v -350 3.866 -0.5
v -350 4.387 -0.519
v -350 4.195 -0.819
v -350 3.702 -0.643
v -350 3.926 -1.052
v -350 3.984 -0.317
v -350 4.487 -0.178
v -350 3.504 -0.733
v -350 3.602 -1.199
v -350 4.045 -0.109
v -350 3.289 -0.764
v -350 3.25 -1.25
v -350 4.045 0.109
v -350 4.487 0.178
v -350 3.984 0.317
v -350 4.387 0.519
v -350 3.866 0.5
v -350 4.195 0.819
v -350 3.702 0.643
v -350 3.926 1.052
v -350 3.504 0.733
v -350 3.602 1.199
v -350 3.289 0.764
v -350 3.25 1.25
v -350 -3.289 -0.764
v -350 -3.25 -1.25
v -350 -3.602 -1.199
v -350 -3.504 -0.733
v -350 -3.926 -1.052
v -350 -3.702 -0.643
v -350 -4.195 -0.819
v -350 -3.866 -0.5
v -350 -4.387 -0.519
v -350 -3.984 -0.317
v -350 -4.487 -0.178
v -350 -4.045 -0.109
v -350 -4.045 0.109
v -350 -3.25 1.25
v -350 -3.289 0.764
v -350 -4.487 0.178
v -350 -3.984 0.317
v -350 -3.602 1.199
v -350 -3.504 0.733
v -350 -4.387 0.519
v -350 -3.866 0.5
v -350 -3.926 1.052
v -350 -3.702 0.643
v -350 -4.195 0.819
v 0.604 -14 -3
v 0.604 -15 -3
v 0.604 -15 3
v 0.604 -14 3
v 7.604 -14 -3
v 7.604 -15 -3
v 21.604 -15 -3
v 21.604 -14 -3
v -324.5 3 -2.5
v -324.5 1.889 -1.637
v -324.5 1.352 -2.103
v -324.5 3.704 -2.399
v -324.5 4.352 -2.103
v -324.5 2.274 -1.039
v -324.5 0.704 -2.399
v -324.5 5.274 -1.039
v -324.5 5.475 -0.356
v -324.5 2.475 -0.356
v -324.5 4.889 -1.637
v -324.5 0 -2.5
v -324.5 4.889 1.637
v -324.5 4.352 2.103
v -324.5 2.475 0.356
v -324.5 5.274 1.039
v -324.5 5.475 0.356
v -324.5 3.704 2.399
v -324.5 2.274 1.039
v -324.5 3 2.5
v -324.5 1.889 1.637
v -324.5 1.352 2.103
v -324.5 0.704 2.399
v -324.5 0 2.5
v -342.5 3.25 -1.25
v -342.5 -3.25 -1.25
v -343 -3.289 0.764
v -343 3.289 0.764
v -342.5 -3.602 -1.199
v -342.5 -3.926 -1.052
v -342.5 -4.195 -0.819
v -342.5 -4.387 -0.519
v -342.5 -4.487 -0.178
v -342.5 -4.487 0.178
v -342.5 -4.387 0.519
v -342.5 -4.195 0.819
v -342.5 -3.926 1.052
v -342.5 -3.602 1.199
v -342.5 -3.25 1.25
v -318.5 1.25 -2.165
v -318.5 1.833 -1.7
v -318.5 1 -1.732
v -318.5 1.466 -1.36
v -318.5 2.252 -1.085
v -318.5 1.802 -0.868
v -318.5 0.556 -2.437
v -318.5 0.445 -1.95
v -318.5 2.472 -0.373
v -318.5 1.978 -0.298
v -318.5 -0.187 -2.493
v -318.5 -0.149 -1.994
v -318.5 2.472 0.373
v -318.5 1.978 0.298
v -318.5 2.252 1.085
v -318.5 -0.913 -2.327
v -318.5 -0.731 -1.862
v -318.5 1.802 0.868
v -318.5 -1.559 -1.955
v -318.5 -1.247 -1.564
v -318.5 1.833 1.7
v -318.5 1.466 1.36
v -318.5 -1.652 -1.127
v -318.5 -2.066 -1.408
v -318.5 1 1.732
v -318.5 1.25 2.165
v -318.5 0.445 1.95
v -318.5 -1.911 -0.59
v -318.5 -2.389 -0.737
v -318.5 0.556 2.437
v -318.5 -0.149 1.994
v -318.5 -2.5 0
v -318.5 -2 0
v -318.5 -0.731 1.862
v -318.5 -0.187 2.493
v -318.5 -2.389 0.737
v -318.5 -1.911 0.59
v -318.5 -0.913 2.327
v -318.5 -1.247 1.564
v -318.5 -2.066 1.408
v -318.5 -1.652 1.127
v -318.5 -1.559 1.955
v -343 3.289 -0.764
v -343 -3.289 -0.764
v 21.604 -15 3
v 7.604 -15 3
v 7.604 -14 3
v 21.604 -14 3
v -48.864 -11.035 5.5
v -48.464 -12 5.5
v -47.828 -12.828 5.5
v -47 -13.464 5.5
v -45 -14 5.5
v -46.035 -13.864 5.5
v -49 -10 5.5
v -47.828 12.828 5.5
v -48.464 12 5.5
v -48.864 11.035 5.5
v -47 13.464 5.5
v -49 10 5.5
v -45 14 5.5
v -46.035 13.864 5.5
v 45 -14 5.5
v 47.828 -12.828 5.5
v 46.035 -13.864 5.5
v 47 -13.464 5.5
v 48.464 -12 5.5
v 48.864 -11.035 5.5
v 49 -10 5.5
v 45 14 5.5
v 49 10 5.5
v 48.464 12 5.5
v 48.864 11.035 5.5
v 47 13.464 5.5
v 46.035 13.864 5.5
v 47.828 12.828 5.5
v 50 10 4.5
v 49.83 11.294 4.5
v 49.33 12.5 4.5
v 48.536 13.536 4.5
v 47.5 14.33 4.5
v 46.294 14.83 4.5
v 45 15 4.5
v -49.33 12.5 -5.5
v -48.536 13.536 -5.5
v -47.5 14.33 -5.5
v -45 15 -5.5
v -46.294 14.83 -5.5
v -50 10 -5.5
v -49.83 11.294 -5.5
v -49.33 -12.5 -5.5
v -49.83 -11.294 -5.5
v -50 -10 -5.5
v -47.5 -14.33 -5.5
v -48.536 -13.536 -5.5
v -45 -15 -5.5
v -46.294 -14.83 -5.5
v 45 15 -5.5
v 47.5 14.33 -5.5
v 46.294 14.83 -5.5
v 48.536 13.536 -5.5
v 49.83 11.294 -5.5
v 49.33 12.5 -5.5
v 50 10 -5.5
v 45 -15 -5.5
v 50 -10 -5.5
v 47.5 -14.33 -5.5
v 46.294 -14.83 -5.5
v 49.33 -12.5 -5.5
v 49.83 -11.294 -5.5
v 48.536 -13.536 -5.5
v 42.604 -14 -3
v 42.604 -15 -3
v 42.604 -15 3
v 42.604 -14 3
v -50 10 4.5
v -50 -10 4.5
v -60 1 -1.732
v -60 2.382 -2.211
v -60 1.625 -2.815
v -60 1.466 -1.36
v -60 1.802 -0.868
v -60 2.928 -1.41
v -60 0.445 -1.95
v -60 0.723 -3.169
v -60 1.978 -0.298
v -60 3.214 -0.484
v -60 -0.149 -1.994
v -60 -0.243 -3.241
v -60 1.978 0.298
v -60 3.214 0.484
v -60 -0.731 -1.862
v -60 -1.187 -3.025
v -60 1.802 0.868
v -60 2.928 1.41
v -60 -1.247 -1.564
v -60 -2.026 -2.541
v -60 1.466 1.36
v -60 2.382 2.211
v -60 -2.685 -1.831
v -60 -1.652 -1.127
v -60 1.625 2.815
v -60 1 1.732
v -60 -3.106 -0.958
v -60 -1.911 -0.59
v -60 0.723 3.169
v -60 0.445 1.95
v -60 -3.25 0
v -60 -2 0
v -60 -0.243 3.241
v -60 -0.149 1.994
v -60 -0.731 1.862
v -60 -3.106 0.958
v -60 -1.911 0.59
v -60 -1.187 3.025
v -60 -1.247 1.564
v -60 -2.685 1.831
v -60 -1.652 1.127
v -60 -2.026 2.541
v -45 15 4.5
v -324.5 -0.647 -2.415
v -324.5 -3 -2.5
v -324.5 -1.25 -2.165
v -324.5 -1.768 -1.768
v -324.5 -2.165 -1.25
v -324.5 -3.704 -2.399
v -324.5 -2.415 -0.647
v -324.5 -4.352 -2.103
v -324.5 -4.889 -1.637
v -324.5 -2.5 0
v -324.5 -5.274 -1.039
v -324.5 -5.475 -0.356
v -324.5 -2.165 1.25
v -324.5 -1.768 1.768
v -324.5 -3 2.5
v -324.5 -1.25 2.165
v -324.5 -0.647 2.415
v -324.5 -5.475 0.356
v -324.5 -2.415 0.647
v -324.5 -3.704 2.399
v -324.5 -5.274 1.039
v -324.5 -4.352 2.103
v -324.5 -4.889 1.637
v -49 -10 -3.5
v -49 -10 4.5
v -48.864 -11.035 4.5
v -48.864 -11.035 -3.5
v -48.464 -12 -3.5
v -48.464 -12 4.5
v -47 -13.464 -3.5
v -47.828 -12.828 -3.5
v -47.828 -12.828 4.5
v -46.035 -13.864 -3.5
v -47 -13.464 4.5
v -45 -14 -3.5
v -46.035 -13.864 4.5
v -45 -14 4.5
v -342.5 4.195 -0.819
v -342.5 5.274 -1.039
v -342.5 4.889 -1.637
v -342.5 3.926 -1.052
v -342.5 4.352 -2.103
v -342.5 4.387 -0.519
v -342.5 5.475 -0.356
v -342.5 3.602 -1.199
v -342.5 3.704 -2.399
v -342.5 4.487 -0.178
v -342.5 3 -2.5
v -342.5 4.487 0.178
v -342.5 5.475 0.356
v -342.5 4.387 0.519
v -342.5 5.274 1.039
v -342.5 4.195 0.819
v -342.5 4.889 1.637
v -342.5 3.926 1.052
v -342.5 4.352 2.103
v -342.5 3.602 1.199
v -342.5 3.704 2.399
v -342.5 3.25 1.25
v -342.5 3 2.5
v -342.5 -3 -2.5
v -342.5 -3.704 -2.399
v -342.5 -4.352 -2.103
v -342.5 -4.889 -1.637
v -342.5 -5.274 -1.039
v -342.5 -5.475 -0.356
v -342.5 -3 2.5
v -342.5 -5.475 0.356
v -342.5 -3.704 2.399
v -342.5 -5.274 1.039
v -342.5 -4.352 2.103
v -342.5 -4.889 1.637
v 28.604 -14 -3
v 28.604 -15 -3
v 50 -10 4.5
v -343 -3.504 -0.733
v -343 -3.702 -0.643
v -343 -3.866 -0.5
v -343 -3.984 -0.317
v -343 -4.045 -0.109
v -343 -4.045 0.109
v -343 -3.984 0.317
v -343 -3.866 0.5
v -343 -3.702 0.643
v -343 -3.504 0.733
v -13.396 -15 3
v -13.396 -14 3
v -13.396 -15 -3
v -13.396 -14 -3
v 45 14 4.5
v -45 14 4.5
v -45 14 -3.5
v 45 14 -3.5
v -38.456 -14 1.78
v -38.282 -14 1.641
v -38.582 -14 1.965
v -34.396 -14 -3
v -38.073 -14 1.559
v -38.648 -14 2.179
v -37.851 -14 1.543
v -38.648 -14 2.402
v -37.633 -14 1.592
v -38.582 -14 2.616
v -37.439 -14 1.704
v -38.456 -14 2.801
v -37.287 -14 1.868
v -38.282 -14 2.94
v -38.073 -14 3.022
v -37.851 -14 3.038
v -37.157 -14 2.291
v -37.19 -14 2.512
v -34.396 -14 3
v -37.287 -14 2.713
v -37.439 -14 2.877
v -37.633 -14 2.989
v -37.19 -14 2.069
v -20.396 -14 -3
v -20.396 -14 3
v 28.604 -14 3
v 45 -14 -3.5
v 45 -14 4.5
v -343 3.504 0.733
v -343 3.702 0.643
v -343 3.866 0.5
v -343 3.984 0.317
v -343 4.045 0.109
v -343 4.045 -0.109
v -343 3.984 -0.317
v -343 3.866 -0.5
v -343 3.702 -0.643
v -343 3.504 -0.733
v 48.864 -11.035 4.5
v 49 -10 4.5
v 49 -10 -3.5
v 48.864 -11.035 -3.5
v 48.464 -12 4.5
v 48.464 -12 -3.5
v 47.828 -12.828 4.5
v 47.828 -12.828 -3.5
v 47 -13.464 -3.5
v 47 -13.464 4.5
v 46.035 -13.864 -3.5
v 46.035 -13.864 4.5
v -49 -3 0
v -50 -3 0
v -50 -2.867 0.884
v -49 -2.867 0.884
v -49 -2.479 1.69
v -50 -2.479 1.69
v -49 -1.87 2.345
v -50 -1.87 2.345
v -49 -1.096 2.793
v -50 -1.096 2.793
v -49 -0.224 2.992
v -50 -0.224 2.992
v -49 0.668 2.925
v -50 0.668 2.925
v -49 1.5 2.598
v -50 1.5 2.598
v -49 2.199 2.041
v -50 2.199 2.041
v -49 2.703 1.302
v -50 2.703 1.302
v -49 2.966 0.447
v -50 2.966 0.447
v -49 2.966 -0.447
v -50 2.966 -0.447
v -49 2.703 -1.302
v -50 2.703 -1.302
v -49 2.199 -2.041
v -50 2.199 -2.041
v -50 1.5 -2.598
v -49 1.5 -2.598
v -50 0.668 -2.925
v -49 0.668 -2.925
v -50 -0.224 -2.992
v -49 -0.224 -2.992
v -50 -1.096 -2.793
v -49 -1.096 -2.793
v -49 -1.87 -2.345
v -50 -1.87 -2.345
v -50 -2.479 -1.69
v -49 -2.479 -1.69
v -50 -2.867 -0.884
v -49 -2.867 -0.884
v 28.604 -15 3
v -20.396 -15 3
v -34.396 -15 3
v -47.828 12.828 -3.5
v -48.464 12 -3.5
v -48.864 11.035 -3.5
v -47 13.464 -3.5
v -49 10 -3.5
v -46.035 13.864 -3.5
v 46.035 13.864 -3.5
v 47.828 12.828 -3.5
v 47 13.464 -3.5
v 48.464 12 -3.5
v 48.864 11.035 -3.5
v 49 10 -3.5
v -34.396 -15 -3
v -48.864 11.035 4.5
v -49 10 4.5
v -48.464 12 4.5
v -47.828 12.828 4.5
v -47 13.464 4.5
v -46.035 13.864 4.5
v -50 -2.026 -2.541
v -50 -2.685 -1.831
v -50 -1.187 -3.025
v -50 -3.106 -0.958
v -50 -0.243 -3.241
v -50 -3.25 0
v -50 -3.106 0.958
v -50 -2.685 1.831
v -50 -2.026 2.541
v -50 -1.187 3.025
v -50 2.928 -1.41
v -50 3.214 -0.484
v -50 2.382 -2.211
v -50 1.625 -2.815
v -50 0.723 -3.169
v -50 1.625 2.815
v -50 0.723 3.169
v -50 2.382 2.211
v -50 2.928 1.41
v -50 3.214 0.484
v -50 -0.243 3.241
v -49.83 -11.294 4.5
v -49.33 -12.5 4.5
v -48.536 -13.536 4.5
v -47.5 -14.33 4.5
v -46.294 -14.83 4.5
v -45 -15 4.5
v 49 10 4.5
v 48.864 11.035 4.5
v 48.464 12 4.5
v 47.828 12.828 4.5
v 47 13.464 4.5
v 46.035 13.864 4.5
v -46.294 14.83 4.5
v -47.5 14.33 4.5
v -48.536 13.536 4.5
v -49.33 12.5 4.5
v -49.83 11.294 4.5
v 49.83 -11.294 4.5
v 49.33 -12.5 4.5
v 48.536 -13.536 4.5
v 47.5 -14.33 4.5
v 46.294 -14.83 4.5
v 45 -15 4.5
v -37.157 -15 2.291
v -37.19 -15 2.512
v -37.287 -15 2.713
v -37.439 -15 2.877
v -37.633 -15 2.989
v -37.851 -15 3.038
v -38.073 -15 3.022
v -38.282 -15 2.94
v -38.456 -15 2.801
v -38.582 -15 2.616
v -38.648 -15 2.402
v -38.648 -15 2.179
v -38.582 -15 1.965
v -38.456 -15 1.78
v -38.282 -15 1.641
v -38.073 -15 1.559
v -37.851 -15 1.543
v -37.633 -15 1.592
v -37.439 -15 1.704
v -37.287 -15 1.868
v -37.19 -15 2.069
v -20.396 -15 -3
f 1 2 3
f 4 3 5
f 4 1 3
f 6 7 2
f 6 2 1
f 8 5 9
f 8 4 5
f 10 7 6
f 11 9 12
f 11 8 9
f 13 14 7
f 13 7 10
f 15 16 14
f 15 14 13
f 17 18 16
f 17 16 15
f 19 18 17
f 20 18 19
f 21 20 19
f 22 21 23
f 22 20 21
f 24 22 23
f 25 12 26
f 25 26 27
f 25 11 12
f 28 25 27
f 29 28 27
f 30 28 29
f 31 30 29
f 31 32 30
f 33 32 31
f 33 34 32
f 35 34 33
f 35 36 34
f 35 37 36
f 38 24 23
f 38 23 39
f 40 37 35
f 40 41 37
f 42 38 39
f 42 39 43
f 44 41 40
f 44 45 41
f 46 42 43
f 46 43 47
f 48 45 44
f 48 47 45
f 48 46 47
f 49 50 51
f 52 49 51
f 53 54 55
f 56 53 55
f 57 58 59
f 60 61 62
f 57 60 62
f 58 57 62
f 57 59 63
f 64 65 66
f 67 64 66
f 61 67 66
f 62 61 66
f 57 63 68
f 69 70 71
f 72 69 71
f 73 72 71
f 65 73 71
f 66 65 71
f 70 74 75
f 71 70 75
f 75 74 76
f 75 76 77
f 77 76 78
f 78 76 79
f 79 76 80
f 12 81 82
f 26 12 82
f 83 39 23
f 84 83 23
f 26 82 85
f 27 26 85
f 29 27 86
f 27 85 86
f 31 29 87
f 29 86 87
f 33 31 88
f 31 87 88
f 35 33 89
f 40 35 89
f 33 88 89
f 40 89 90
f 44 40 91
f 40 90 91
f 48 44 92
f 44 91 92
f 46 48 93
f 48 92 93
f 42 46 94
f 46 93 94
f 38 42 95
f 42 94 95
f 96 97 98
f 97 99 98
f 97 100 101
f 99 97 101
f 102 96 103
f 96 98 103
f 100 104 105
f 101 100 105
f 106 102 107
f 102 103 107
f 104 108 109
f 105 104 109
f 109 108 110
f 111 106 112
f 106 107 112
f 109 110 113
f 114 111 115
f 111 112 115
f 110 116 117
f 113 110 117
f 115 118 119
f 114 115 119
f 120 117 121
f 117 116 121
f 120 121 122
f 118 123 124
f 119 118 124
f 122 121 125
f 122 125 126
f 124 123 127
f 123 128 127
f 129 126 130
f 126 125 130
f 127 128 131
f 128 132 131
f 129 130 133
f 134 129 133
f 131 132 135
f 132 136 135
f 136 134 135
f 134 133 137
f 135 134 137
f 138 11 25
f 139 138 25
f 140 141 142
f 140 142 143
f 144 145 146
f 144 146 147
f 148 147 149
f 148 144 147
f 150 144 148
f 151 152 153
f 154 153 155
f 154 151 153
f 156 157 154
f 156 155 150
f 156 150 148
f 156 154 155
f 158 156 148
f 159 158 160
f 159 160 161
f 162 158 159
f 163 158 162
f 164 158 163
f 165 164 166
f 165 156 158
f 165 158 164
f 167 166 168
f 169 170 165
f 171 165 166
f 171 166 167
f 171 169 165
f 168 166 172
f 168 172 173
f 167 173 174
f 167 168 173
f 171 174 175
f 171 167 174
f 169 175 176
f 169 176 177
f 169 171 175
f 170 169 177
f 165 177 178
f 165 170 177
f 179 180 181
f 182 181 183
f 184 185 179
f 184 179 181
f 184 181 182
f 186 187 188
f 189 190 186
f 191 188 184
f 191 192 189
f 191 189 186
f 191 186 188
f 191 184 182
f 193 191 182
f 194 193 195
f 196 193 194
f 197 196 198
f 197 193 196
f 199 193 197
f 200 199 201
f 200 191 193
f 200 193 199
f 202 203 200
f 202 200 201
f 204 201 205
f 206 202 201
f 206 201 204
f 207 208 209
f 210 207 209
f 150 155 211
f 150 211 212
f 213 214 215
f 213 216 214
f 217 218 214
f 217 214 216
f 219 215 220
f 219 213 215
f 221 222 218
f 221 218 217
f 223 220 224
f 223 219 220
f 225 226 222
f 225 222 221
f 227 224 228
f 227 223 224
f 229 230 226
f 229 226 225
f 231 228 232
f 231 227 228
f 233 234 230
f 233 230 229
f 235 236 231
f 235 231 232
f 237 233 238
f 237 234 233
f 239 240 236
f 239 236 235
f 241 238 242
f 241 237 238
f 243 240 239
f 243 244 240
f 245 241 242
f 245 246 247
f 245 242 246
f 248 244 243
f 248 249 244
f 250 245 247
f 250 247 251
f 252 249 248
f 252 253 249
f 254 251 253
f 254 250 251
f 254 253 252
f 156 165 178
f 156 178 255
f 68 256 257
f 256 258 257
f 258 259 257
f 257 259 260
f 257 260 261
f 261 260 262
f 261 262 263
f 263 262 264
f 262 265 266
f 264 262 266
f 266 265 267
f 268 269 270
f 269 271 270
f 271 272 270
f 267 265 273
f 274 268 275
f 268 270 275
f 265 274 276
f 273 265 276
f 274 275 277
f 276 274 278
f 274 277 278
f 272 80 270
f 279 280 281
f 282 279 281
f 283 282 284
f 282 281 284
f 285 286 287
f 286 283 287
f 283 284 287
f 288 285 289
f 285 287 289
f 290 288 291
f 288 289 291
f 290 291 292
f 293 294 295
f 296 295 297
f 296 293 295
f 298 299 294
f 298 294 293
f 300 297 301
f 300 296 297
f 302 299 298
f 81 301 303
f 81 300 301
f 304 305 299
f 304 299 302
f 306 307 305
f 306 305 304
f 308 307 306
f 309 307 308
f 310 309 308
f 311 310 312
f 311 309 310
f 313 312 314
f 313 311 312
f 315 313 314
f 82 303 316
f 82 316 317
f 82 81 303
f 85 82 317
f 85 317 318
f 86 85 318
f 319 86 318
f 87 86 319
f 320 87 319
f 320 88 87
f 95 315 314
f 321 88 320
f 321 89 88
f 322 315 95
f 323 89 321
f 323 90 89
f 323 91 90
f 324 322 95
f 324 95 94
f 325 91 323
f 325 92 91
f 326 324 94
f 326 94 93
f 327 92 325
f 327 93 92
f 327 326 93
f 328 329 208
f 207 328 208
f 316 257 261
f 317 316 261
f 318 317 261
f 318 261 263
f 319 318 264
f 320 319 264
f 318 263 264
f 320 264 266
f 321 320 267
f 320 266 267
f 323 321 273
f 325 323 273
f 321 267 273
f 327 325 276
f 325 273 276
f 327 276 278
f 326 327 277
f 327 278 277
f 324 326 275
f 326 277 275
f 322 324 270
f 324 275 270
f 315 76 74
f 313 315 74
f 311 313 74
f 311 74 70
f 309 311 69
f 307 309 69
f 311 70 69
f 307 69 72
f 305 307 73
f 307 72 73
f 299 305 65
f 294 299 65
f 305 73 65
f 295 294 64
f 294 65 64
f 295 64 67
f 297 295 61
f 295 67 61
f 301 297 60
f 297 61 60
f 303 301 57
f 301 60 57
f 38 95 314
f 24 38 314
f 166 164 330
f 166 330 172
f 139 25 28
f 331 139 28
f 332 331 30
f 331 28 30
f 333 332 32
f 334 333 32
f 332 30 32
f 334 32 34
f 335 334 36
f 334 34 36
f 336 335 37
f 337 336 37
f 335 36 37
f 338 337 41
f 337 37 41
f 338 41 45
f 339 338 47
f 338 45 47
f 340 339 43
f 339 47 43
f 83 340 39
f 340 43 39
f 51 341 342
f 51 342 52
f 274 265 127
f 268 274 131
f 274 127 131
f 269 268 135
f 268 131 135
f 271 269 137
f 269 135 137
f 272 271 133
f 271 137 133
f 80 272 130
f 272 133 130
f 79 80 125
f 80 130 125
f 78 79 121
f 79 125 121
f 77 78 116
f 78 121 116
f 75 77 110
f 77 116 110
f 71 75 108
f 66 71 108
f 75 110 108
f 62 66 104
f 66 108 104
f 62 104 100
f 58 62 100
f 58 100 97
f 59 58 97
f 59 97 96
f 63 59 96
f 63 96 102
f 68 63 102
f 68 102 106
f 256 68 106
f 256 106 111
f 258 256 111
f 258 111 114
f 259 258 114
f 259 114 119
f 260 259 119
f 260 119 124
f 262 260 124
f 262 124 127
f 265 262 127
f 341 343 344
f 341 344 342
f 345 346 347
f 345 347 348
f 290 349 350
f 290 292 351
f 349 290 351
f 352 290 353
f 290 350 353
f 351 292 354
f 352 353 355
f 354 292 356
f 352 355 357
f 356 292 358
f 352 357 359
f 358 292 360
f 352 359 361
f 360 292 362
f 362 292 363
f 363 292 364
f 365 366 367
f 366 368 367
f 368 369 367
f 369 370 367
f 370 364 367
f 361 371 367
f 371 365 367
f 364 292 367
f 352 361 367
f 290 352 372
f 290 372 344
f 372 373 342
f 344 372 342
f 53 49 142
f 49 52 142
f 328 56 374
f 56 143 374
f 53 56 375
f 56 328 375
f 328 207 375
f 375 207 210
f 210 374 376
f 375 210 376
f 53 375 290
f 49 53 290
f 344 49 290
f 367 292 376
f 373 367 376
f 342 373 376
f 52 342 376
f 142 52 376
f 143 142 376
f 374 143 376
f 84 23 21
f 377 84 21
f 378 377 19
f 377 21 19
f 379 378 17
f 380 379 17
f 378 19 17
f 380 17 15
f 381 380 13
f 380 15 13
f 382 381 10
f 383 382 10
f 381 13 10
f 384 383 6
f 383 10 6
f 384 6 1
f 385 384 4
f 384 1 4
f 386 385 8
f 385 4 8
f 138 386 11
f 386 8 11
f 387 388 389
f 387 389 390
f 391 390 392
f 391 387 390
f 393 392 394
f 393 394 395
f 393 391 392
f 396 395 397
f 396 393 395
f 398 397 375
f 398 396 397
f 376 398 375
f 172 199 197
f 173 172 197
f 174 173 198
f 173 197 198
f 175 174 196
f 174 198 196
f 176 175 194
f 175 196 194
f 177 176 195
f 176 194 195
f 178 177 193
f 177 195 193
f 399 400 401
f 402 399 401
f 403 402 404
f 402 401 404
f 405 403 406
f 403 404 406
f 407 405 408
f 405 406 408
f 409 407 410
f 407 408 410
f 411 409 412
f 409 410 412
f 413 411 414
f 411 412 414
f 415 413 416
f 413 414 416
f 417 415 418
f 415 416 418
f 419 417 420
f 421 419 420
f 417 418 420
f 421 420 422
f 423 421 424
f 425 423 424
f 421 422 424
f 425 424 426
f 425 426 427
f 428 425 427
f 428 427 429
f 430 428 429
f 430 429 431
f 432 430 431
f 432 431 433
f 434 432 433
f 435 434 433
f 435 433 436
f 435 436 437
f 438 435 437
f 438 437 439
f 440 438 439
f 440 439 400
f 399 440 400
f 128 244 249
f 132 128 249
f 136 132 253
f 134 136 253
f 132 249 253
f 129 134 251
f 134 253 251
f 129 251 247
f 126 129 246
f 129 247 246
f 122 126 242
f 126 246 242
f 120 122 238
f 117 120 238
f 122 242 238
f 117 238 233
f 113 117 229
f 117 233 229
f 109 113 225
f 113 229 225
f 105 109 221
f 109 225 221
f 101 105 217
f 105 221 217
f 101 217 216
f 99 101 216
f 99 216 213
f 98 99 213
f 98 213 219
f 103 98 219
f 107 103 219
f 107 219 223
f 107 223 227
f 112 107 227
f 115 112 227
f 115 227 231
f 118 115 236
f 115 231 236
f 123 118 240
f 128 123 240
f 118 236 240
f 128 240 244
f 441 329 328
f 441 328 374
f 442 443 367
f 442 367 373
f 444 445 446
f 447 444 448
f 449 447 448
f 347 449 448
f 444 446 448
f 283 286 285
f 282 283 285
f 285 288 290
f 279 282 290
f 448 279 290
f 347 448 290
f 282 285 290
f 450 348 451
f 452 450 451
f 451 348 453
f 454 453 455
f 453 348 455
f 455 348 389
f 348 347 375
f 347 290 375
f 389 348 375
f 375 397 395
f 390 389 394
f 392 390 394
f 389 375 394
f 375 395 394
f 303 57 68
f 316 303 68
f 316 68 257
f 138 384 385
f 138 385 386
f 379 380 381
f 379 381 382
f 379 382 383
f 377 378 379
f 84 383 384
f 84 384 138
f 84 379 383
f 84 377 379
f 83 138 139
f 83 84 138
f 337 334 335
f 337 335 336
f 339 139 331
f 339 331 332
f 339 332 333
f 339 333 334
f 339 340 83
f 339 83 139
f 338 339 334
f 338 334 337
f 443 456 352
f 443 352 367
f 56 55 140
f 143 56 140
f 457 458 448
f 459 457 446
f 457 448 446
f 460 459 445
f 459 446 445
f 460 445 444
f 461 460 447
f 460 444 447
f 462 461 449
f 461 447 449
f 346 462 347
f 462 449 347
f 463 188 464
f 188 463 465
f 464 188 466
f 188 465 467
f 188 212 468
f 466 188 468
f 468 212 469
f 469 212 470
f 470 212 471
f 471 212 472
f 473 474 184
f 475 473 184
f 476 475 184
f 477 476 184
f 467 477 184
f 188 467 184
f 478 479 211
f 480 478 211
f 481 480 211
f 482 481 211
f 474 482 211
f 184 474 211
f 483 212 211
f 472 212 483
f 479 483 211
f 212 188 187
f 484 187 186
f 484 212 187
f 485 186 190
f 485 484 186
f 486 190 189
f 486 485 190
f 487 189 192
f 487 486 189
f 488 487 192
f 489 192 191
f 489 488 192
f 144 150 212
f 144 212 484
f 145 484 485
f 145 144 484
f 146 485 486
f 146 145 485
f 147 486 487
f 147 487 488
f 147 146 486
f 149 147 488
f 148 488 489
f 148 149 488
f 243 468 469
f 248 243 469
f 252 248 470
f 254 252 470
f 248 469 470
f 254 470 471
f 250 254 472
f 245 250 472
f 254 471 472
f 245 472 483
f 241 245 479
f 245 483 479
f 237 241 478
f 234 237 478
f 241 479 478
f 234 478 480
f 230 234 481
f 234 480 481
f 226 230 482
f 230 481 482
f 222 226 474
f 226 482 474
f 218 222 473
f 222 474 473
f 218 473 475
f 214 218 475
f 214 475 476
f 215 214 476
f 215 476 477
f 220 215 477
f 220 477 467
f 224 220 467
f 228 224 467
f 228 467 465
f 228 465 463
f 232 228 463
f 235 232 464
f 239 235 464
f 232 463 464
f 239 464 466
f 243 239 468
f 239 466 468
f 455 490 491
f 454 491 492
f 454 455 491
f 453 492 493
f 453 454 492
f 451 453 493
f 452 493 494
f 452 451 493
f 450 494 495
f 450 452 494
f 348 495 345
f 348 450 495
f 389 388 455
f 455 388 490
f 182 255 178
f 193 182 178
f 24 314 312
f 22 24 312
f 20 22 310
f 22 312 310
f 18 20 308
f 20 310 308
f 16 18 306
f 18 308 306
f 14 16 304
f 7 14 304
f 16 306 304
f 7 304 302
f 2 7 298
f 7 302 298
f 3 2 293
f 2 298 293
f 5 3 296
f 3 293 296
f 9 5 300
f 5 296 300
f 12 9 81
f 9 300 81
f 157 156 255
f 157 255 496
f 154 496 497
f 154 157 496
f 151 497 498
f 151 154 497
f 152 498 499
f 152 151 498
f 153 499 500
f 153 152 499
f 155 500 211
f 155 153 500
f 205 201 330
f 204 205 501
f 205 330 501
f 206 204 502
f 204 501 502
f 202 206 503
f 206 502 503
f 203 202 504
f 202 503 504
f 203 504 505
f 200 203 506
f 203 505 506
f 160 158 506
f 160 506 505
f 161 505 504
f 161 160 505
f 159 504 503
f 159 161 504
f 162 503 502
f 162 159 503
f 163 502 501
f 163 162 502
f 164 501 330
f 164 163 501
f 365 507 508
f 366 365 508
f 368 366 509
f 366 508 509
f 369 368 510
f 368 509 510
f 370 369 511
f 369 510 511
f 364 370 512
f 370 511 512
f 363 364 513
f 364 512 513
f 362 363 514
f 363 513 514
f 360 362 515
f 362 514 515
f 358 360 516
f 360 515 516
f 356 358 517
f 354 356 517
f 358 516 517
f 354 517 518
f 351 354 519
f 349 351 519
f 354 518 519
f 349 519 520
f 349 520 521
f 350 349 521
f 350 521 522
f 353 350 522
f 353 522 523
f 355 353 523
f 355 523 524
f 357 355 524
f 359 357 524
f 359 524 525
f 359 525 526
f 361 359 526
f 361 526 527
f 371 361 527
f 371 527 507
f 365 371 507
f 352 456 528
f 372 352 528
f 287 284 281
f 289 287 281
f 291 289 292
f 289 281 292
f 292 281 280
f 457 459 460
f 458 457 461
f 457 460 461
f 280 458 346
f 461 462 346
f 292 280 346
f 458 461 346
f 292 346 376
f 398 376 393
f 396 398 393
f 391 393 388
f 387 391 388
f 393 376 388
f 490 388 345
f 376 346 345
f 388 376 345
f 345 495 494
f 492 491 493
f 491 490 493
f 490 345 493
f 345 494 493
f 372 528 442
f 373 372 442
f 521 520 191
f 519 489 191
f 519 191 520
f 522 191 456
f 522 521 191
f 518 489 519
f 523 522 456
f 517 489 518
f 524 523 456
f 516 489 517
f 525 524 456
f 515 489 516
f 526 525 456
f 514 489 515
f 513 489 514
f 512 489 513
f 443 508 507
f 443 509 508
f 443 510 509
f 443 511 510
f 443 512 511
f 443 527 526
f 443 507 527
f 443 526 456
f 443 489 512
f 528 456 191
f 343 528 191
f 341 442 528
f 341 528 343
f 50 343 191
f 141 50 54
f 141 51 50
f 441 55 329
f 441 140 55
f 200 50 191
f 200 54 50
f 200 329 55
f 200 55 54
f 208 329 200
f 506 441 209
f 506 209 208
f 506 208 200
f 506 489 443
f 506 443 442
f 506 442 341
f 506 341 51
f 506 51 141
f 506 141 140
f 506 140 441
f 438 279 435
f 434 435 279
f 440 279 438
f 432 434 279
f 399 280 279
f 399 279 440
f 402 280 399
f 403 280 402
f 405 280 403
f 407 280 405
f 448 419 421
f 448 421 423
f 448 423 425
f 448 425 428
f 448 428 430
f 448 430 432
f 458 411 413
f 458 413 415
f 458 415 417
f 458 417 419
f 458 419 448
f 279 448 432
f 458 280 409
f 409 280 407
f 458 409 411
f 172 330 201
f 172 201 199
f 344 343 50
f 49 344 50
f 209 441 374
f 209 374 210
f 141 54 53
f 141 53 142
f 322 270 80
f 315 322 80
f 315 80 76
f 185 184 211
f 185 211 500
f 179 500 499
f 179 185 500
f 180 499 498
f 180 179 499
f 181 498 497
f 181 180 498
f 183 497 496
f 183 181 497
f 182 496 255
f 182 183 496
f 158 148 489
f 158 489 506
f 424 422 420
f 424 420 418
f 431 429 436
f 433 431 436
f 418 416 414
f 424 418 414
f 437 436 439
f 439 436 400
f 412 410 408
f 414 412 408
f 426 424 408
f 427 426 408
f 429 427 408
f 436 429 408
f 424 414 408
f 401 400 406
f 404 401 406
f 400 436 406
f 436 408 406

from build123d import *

# Parameters (mm, degrees)
SKETCH_W        = 100
SKETCH_H        = 30
PAD_DEPTH       = 5.5
FILLET_R        = 5
THICKNESS_T     = -1
PAD001_DEPTH    = 2
CHAMFER_SIZE    = 1
SKETCH002_R     = 3
HOLE_DEPTH      = 25
HOLE_TIPS_R     = 3
SKETCH003_R     = 0.75
SKETCH003_W     = 14
SKETCH003_H     = 6
POCKET_DEPTH    = 5
SKETCH004_R     = 3.25
PAD002_DEPTH    = 10
SKETCH005_R     = 2
PAD003_DEPTH    = 258.5
SKETCH006_R     = 2.5
PAD004_DEPTH    = 6
PAD005_DEPTH    = 18
PAD006_DEPTH    = 7.5
POCKET001_DEPTH = 7


with BuildPart() as part:
    # Sketch → Pad (new body, symmetric)
    with BuildSketch(Plane.XY):
        Rectangle(SKETCH_W, SKETCH_H)
    extrude(amount=PAD_DEPTH, both=True)

    # Fillet
    fillet_edges = [part.edges().sort_by_distance(p)[0] for p in [
        (-50, -15, 0),
        (-50, 15, 0),
        (50, 15, 0),
        (50, -15, 0),
    ]]
    fillet(fillet_edges, radius=FILLET_R)

    # Thickness
    thickness_openings = [part.faces().sort_by_distance(p)[0] for p in [
        (0, 0, -5.5),
    ]]
    offset(amount=THICKNESS_T, openings=thickness_openings)

    # Sketch001 (on Face10 of Thickness) → Pad001 (join)
    with BuildSketch(Plane(origin=(0, 0, -5.5), x_dir=(1, 0, 0), z_dir=(0, 0, -1))):
        with BuildLine():
            ThreePointArc((-45, 14), (-47.828427, 12.828427), (-49, 10))
            Line((-49, -10), (-49, 10))
            ThreePointArc((-49, -10), (-47.828427, -12.828427), (-45, -14))
            Line((45, -14), (-45, -14))
            ThreePointArc((45, -14), (47.828427, -12.828427), (49, -10))
            Line((49, 10), (49, -10))
            ThreePointArc((49, 10), (47.828427, 12.828427), (45, 14))
            Line((-45, 14), (45, 14))
        make_face()
    extrude(amount=-PAD001_DEPTH)

    # Chamfer
    chamfer_edges = [part.edges().sort_by_distance(p)[0] for p in [
        (0, -15, 5.5),
        (48.535534, -13.535534, 5.5),
        (50, 0, 5.5),
        (48.535534, 13.535534, 5.5),
        (0, 15, 5.5),
        (-48.535534, 13.535534, 5.5),
        (-50, 0, 5.5),
        (-48.535534, -13.535534, 5.5),
    ]]
    chamfer(chamfer_edges, length=CHAMFER_SIZE)

    # Sketch002 (on Face7 of Chamfer) → Hole (cut)
    with BuildSketch(Plane(origin=(-50, 0, 0), x_dir=(0, -1, 0), z_dir=(-1, 0, 0))):
        Circle(SKETCH002_R)
    extrude(amount=-HOLE_DEPTH, mode=Mode.SUBTRACT)

    # Hole tips → Hole tip 1 section 0
    with BuildSketch(Plane(origin=(-25, 0, 0), x_dir=(0, -1, 0), z_dir=(-1, 0, 0)), mode=Mode.PRIVATE) as hole_tip_1_s0:
        Circle(HOLE_TIPS_R)
    loft([hole_tip_1_s0.sketch, Vertex(-23.197418, 0, 0)], mode=Mode.SUBTRACT)

    # Sketch003 (on Face11 of Hole) → Pocket (cut)
    with BuildSketch(Plane.XZ.offset(15)):
        with Locations((-37.906574, 2.290524)):
            Circle(SKETCH003_R)
        with Locations((35.604452, 0)):
            Rectangle(SKETCH003_W, SKETCH003_H)
        with Locations((14.604452, 0)):
            Rectangle(SKETCH003_W, SKETCH003_H)
        with Locations((-6.395548, 0)):
            Rectangle(SKETCH003_W, SKETCH003_H)
        with Locations((-27.395548, 0)):
            Rectangle(SKETCH003_W, SKETCH003_H)
    extrude(amount=-POCKET_DEPTH, mode=Mode.SUBTRACT)

    # Sketch004 (on Face7 of Pocket) → Pad002 (join)
    with BuildSketch(Plane(origin=(-50, 0, 0), x_dir=(0, -1, 0), z_dir=(-1, 0, 0))):
        Circle(SKETCH004_R)
    extrude(amount=PAD002_DEPTH)

    # Sketch005 (on Face38 of Pad002) → Pad003 (join)
    with BuildSketch(Plane(origin=(-60, 0, 0), x_dir=(0, -1, 0), z_dir=(-1, 0, 0))):
        Circle(SKETCH005_R)
    extrude(amount=PAD003_DEPTH)

    # Sketch006 (on Face45 of Pad003) → Pad004 (join)
    with BuildSketch(Plane(origin=(-318.5, 0, 0), x_dir=(0, -1, 0), z_dir=(-1, 0, 0))):
        Circle(SKETCH006_R)
    extrude(amount=PAD004_DEPTH)

    # Sketch007 (on Face3 of Pad004) → Pad005 (join)
    with BuildSketch(Plane(origin=(-324.5, 0, 0), x_dir=(0, -1, 0), z_dir=(-1, 0, 0))):
        with BuildLine():
            ThreePointArc((-3, 2.5), (-5.5, 0), (-3, -2.5))
            Line((-3, -2.5), (3, -2.5))
            ThreePointArc((3, -2.5), (5.5, 0), (3, 2.5))
            Line((3, 2.5), (-3, 2.5))
        make_face()
    extrude(amount=PAD005_DEPTH)

    # Sketch008 (on Face11 of Pad005) → Pad006 (join)
    with BuildSketch(Plane(origin=(-342.5, 0, 0), x_dir=(0, -1, 0), z_dir=(-1, 0, 0))):
        with BuildLine():
            ThreePointArc((-3.25, 1.25), (-4.5, 0), (-3.25, -1.25))
            Line((-3.25, -1.25), (3.25, -1.25))
            ThreePointArc((3.25, -1.25), (4.5, 0), (3.25, 1.25))
            Line((3.25, 1.25), (-3.25, 1.25))
        make_face()
    extrude(amount=PAD006_DEPTH)

    # Sketch009 (on Face18 of Pad006) → Pocket001 (cut)
    with BuildSketch(Plane(origin=(-350, 0, 0), x_dir=(0, -1, 0), z_dir=(-1, 0, 0))):
        with BuildLine():
            ThreePointArc((-3.288859, 0.763778), (-4.052637, 0), (-3.288859, -0.763778))
            Line((-3.288859, -0.763778), (3.288859, -0.763778))
            ThreePointArc((3.288859, -0.763778), (4.052637, 0), (3.288859, 0.763778))
            Line((3.288859, 0.763778), (-3.288859, 0.763778))
        make_face()
    extrude(amount=-POCKET001_DEPTH, mode=Mode.SUBTRACT)


solid = part.part
